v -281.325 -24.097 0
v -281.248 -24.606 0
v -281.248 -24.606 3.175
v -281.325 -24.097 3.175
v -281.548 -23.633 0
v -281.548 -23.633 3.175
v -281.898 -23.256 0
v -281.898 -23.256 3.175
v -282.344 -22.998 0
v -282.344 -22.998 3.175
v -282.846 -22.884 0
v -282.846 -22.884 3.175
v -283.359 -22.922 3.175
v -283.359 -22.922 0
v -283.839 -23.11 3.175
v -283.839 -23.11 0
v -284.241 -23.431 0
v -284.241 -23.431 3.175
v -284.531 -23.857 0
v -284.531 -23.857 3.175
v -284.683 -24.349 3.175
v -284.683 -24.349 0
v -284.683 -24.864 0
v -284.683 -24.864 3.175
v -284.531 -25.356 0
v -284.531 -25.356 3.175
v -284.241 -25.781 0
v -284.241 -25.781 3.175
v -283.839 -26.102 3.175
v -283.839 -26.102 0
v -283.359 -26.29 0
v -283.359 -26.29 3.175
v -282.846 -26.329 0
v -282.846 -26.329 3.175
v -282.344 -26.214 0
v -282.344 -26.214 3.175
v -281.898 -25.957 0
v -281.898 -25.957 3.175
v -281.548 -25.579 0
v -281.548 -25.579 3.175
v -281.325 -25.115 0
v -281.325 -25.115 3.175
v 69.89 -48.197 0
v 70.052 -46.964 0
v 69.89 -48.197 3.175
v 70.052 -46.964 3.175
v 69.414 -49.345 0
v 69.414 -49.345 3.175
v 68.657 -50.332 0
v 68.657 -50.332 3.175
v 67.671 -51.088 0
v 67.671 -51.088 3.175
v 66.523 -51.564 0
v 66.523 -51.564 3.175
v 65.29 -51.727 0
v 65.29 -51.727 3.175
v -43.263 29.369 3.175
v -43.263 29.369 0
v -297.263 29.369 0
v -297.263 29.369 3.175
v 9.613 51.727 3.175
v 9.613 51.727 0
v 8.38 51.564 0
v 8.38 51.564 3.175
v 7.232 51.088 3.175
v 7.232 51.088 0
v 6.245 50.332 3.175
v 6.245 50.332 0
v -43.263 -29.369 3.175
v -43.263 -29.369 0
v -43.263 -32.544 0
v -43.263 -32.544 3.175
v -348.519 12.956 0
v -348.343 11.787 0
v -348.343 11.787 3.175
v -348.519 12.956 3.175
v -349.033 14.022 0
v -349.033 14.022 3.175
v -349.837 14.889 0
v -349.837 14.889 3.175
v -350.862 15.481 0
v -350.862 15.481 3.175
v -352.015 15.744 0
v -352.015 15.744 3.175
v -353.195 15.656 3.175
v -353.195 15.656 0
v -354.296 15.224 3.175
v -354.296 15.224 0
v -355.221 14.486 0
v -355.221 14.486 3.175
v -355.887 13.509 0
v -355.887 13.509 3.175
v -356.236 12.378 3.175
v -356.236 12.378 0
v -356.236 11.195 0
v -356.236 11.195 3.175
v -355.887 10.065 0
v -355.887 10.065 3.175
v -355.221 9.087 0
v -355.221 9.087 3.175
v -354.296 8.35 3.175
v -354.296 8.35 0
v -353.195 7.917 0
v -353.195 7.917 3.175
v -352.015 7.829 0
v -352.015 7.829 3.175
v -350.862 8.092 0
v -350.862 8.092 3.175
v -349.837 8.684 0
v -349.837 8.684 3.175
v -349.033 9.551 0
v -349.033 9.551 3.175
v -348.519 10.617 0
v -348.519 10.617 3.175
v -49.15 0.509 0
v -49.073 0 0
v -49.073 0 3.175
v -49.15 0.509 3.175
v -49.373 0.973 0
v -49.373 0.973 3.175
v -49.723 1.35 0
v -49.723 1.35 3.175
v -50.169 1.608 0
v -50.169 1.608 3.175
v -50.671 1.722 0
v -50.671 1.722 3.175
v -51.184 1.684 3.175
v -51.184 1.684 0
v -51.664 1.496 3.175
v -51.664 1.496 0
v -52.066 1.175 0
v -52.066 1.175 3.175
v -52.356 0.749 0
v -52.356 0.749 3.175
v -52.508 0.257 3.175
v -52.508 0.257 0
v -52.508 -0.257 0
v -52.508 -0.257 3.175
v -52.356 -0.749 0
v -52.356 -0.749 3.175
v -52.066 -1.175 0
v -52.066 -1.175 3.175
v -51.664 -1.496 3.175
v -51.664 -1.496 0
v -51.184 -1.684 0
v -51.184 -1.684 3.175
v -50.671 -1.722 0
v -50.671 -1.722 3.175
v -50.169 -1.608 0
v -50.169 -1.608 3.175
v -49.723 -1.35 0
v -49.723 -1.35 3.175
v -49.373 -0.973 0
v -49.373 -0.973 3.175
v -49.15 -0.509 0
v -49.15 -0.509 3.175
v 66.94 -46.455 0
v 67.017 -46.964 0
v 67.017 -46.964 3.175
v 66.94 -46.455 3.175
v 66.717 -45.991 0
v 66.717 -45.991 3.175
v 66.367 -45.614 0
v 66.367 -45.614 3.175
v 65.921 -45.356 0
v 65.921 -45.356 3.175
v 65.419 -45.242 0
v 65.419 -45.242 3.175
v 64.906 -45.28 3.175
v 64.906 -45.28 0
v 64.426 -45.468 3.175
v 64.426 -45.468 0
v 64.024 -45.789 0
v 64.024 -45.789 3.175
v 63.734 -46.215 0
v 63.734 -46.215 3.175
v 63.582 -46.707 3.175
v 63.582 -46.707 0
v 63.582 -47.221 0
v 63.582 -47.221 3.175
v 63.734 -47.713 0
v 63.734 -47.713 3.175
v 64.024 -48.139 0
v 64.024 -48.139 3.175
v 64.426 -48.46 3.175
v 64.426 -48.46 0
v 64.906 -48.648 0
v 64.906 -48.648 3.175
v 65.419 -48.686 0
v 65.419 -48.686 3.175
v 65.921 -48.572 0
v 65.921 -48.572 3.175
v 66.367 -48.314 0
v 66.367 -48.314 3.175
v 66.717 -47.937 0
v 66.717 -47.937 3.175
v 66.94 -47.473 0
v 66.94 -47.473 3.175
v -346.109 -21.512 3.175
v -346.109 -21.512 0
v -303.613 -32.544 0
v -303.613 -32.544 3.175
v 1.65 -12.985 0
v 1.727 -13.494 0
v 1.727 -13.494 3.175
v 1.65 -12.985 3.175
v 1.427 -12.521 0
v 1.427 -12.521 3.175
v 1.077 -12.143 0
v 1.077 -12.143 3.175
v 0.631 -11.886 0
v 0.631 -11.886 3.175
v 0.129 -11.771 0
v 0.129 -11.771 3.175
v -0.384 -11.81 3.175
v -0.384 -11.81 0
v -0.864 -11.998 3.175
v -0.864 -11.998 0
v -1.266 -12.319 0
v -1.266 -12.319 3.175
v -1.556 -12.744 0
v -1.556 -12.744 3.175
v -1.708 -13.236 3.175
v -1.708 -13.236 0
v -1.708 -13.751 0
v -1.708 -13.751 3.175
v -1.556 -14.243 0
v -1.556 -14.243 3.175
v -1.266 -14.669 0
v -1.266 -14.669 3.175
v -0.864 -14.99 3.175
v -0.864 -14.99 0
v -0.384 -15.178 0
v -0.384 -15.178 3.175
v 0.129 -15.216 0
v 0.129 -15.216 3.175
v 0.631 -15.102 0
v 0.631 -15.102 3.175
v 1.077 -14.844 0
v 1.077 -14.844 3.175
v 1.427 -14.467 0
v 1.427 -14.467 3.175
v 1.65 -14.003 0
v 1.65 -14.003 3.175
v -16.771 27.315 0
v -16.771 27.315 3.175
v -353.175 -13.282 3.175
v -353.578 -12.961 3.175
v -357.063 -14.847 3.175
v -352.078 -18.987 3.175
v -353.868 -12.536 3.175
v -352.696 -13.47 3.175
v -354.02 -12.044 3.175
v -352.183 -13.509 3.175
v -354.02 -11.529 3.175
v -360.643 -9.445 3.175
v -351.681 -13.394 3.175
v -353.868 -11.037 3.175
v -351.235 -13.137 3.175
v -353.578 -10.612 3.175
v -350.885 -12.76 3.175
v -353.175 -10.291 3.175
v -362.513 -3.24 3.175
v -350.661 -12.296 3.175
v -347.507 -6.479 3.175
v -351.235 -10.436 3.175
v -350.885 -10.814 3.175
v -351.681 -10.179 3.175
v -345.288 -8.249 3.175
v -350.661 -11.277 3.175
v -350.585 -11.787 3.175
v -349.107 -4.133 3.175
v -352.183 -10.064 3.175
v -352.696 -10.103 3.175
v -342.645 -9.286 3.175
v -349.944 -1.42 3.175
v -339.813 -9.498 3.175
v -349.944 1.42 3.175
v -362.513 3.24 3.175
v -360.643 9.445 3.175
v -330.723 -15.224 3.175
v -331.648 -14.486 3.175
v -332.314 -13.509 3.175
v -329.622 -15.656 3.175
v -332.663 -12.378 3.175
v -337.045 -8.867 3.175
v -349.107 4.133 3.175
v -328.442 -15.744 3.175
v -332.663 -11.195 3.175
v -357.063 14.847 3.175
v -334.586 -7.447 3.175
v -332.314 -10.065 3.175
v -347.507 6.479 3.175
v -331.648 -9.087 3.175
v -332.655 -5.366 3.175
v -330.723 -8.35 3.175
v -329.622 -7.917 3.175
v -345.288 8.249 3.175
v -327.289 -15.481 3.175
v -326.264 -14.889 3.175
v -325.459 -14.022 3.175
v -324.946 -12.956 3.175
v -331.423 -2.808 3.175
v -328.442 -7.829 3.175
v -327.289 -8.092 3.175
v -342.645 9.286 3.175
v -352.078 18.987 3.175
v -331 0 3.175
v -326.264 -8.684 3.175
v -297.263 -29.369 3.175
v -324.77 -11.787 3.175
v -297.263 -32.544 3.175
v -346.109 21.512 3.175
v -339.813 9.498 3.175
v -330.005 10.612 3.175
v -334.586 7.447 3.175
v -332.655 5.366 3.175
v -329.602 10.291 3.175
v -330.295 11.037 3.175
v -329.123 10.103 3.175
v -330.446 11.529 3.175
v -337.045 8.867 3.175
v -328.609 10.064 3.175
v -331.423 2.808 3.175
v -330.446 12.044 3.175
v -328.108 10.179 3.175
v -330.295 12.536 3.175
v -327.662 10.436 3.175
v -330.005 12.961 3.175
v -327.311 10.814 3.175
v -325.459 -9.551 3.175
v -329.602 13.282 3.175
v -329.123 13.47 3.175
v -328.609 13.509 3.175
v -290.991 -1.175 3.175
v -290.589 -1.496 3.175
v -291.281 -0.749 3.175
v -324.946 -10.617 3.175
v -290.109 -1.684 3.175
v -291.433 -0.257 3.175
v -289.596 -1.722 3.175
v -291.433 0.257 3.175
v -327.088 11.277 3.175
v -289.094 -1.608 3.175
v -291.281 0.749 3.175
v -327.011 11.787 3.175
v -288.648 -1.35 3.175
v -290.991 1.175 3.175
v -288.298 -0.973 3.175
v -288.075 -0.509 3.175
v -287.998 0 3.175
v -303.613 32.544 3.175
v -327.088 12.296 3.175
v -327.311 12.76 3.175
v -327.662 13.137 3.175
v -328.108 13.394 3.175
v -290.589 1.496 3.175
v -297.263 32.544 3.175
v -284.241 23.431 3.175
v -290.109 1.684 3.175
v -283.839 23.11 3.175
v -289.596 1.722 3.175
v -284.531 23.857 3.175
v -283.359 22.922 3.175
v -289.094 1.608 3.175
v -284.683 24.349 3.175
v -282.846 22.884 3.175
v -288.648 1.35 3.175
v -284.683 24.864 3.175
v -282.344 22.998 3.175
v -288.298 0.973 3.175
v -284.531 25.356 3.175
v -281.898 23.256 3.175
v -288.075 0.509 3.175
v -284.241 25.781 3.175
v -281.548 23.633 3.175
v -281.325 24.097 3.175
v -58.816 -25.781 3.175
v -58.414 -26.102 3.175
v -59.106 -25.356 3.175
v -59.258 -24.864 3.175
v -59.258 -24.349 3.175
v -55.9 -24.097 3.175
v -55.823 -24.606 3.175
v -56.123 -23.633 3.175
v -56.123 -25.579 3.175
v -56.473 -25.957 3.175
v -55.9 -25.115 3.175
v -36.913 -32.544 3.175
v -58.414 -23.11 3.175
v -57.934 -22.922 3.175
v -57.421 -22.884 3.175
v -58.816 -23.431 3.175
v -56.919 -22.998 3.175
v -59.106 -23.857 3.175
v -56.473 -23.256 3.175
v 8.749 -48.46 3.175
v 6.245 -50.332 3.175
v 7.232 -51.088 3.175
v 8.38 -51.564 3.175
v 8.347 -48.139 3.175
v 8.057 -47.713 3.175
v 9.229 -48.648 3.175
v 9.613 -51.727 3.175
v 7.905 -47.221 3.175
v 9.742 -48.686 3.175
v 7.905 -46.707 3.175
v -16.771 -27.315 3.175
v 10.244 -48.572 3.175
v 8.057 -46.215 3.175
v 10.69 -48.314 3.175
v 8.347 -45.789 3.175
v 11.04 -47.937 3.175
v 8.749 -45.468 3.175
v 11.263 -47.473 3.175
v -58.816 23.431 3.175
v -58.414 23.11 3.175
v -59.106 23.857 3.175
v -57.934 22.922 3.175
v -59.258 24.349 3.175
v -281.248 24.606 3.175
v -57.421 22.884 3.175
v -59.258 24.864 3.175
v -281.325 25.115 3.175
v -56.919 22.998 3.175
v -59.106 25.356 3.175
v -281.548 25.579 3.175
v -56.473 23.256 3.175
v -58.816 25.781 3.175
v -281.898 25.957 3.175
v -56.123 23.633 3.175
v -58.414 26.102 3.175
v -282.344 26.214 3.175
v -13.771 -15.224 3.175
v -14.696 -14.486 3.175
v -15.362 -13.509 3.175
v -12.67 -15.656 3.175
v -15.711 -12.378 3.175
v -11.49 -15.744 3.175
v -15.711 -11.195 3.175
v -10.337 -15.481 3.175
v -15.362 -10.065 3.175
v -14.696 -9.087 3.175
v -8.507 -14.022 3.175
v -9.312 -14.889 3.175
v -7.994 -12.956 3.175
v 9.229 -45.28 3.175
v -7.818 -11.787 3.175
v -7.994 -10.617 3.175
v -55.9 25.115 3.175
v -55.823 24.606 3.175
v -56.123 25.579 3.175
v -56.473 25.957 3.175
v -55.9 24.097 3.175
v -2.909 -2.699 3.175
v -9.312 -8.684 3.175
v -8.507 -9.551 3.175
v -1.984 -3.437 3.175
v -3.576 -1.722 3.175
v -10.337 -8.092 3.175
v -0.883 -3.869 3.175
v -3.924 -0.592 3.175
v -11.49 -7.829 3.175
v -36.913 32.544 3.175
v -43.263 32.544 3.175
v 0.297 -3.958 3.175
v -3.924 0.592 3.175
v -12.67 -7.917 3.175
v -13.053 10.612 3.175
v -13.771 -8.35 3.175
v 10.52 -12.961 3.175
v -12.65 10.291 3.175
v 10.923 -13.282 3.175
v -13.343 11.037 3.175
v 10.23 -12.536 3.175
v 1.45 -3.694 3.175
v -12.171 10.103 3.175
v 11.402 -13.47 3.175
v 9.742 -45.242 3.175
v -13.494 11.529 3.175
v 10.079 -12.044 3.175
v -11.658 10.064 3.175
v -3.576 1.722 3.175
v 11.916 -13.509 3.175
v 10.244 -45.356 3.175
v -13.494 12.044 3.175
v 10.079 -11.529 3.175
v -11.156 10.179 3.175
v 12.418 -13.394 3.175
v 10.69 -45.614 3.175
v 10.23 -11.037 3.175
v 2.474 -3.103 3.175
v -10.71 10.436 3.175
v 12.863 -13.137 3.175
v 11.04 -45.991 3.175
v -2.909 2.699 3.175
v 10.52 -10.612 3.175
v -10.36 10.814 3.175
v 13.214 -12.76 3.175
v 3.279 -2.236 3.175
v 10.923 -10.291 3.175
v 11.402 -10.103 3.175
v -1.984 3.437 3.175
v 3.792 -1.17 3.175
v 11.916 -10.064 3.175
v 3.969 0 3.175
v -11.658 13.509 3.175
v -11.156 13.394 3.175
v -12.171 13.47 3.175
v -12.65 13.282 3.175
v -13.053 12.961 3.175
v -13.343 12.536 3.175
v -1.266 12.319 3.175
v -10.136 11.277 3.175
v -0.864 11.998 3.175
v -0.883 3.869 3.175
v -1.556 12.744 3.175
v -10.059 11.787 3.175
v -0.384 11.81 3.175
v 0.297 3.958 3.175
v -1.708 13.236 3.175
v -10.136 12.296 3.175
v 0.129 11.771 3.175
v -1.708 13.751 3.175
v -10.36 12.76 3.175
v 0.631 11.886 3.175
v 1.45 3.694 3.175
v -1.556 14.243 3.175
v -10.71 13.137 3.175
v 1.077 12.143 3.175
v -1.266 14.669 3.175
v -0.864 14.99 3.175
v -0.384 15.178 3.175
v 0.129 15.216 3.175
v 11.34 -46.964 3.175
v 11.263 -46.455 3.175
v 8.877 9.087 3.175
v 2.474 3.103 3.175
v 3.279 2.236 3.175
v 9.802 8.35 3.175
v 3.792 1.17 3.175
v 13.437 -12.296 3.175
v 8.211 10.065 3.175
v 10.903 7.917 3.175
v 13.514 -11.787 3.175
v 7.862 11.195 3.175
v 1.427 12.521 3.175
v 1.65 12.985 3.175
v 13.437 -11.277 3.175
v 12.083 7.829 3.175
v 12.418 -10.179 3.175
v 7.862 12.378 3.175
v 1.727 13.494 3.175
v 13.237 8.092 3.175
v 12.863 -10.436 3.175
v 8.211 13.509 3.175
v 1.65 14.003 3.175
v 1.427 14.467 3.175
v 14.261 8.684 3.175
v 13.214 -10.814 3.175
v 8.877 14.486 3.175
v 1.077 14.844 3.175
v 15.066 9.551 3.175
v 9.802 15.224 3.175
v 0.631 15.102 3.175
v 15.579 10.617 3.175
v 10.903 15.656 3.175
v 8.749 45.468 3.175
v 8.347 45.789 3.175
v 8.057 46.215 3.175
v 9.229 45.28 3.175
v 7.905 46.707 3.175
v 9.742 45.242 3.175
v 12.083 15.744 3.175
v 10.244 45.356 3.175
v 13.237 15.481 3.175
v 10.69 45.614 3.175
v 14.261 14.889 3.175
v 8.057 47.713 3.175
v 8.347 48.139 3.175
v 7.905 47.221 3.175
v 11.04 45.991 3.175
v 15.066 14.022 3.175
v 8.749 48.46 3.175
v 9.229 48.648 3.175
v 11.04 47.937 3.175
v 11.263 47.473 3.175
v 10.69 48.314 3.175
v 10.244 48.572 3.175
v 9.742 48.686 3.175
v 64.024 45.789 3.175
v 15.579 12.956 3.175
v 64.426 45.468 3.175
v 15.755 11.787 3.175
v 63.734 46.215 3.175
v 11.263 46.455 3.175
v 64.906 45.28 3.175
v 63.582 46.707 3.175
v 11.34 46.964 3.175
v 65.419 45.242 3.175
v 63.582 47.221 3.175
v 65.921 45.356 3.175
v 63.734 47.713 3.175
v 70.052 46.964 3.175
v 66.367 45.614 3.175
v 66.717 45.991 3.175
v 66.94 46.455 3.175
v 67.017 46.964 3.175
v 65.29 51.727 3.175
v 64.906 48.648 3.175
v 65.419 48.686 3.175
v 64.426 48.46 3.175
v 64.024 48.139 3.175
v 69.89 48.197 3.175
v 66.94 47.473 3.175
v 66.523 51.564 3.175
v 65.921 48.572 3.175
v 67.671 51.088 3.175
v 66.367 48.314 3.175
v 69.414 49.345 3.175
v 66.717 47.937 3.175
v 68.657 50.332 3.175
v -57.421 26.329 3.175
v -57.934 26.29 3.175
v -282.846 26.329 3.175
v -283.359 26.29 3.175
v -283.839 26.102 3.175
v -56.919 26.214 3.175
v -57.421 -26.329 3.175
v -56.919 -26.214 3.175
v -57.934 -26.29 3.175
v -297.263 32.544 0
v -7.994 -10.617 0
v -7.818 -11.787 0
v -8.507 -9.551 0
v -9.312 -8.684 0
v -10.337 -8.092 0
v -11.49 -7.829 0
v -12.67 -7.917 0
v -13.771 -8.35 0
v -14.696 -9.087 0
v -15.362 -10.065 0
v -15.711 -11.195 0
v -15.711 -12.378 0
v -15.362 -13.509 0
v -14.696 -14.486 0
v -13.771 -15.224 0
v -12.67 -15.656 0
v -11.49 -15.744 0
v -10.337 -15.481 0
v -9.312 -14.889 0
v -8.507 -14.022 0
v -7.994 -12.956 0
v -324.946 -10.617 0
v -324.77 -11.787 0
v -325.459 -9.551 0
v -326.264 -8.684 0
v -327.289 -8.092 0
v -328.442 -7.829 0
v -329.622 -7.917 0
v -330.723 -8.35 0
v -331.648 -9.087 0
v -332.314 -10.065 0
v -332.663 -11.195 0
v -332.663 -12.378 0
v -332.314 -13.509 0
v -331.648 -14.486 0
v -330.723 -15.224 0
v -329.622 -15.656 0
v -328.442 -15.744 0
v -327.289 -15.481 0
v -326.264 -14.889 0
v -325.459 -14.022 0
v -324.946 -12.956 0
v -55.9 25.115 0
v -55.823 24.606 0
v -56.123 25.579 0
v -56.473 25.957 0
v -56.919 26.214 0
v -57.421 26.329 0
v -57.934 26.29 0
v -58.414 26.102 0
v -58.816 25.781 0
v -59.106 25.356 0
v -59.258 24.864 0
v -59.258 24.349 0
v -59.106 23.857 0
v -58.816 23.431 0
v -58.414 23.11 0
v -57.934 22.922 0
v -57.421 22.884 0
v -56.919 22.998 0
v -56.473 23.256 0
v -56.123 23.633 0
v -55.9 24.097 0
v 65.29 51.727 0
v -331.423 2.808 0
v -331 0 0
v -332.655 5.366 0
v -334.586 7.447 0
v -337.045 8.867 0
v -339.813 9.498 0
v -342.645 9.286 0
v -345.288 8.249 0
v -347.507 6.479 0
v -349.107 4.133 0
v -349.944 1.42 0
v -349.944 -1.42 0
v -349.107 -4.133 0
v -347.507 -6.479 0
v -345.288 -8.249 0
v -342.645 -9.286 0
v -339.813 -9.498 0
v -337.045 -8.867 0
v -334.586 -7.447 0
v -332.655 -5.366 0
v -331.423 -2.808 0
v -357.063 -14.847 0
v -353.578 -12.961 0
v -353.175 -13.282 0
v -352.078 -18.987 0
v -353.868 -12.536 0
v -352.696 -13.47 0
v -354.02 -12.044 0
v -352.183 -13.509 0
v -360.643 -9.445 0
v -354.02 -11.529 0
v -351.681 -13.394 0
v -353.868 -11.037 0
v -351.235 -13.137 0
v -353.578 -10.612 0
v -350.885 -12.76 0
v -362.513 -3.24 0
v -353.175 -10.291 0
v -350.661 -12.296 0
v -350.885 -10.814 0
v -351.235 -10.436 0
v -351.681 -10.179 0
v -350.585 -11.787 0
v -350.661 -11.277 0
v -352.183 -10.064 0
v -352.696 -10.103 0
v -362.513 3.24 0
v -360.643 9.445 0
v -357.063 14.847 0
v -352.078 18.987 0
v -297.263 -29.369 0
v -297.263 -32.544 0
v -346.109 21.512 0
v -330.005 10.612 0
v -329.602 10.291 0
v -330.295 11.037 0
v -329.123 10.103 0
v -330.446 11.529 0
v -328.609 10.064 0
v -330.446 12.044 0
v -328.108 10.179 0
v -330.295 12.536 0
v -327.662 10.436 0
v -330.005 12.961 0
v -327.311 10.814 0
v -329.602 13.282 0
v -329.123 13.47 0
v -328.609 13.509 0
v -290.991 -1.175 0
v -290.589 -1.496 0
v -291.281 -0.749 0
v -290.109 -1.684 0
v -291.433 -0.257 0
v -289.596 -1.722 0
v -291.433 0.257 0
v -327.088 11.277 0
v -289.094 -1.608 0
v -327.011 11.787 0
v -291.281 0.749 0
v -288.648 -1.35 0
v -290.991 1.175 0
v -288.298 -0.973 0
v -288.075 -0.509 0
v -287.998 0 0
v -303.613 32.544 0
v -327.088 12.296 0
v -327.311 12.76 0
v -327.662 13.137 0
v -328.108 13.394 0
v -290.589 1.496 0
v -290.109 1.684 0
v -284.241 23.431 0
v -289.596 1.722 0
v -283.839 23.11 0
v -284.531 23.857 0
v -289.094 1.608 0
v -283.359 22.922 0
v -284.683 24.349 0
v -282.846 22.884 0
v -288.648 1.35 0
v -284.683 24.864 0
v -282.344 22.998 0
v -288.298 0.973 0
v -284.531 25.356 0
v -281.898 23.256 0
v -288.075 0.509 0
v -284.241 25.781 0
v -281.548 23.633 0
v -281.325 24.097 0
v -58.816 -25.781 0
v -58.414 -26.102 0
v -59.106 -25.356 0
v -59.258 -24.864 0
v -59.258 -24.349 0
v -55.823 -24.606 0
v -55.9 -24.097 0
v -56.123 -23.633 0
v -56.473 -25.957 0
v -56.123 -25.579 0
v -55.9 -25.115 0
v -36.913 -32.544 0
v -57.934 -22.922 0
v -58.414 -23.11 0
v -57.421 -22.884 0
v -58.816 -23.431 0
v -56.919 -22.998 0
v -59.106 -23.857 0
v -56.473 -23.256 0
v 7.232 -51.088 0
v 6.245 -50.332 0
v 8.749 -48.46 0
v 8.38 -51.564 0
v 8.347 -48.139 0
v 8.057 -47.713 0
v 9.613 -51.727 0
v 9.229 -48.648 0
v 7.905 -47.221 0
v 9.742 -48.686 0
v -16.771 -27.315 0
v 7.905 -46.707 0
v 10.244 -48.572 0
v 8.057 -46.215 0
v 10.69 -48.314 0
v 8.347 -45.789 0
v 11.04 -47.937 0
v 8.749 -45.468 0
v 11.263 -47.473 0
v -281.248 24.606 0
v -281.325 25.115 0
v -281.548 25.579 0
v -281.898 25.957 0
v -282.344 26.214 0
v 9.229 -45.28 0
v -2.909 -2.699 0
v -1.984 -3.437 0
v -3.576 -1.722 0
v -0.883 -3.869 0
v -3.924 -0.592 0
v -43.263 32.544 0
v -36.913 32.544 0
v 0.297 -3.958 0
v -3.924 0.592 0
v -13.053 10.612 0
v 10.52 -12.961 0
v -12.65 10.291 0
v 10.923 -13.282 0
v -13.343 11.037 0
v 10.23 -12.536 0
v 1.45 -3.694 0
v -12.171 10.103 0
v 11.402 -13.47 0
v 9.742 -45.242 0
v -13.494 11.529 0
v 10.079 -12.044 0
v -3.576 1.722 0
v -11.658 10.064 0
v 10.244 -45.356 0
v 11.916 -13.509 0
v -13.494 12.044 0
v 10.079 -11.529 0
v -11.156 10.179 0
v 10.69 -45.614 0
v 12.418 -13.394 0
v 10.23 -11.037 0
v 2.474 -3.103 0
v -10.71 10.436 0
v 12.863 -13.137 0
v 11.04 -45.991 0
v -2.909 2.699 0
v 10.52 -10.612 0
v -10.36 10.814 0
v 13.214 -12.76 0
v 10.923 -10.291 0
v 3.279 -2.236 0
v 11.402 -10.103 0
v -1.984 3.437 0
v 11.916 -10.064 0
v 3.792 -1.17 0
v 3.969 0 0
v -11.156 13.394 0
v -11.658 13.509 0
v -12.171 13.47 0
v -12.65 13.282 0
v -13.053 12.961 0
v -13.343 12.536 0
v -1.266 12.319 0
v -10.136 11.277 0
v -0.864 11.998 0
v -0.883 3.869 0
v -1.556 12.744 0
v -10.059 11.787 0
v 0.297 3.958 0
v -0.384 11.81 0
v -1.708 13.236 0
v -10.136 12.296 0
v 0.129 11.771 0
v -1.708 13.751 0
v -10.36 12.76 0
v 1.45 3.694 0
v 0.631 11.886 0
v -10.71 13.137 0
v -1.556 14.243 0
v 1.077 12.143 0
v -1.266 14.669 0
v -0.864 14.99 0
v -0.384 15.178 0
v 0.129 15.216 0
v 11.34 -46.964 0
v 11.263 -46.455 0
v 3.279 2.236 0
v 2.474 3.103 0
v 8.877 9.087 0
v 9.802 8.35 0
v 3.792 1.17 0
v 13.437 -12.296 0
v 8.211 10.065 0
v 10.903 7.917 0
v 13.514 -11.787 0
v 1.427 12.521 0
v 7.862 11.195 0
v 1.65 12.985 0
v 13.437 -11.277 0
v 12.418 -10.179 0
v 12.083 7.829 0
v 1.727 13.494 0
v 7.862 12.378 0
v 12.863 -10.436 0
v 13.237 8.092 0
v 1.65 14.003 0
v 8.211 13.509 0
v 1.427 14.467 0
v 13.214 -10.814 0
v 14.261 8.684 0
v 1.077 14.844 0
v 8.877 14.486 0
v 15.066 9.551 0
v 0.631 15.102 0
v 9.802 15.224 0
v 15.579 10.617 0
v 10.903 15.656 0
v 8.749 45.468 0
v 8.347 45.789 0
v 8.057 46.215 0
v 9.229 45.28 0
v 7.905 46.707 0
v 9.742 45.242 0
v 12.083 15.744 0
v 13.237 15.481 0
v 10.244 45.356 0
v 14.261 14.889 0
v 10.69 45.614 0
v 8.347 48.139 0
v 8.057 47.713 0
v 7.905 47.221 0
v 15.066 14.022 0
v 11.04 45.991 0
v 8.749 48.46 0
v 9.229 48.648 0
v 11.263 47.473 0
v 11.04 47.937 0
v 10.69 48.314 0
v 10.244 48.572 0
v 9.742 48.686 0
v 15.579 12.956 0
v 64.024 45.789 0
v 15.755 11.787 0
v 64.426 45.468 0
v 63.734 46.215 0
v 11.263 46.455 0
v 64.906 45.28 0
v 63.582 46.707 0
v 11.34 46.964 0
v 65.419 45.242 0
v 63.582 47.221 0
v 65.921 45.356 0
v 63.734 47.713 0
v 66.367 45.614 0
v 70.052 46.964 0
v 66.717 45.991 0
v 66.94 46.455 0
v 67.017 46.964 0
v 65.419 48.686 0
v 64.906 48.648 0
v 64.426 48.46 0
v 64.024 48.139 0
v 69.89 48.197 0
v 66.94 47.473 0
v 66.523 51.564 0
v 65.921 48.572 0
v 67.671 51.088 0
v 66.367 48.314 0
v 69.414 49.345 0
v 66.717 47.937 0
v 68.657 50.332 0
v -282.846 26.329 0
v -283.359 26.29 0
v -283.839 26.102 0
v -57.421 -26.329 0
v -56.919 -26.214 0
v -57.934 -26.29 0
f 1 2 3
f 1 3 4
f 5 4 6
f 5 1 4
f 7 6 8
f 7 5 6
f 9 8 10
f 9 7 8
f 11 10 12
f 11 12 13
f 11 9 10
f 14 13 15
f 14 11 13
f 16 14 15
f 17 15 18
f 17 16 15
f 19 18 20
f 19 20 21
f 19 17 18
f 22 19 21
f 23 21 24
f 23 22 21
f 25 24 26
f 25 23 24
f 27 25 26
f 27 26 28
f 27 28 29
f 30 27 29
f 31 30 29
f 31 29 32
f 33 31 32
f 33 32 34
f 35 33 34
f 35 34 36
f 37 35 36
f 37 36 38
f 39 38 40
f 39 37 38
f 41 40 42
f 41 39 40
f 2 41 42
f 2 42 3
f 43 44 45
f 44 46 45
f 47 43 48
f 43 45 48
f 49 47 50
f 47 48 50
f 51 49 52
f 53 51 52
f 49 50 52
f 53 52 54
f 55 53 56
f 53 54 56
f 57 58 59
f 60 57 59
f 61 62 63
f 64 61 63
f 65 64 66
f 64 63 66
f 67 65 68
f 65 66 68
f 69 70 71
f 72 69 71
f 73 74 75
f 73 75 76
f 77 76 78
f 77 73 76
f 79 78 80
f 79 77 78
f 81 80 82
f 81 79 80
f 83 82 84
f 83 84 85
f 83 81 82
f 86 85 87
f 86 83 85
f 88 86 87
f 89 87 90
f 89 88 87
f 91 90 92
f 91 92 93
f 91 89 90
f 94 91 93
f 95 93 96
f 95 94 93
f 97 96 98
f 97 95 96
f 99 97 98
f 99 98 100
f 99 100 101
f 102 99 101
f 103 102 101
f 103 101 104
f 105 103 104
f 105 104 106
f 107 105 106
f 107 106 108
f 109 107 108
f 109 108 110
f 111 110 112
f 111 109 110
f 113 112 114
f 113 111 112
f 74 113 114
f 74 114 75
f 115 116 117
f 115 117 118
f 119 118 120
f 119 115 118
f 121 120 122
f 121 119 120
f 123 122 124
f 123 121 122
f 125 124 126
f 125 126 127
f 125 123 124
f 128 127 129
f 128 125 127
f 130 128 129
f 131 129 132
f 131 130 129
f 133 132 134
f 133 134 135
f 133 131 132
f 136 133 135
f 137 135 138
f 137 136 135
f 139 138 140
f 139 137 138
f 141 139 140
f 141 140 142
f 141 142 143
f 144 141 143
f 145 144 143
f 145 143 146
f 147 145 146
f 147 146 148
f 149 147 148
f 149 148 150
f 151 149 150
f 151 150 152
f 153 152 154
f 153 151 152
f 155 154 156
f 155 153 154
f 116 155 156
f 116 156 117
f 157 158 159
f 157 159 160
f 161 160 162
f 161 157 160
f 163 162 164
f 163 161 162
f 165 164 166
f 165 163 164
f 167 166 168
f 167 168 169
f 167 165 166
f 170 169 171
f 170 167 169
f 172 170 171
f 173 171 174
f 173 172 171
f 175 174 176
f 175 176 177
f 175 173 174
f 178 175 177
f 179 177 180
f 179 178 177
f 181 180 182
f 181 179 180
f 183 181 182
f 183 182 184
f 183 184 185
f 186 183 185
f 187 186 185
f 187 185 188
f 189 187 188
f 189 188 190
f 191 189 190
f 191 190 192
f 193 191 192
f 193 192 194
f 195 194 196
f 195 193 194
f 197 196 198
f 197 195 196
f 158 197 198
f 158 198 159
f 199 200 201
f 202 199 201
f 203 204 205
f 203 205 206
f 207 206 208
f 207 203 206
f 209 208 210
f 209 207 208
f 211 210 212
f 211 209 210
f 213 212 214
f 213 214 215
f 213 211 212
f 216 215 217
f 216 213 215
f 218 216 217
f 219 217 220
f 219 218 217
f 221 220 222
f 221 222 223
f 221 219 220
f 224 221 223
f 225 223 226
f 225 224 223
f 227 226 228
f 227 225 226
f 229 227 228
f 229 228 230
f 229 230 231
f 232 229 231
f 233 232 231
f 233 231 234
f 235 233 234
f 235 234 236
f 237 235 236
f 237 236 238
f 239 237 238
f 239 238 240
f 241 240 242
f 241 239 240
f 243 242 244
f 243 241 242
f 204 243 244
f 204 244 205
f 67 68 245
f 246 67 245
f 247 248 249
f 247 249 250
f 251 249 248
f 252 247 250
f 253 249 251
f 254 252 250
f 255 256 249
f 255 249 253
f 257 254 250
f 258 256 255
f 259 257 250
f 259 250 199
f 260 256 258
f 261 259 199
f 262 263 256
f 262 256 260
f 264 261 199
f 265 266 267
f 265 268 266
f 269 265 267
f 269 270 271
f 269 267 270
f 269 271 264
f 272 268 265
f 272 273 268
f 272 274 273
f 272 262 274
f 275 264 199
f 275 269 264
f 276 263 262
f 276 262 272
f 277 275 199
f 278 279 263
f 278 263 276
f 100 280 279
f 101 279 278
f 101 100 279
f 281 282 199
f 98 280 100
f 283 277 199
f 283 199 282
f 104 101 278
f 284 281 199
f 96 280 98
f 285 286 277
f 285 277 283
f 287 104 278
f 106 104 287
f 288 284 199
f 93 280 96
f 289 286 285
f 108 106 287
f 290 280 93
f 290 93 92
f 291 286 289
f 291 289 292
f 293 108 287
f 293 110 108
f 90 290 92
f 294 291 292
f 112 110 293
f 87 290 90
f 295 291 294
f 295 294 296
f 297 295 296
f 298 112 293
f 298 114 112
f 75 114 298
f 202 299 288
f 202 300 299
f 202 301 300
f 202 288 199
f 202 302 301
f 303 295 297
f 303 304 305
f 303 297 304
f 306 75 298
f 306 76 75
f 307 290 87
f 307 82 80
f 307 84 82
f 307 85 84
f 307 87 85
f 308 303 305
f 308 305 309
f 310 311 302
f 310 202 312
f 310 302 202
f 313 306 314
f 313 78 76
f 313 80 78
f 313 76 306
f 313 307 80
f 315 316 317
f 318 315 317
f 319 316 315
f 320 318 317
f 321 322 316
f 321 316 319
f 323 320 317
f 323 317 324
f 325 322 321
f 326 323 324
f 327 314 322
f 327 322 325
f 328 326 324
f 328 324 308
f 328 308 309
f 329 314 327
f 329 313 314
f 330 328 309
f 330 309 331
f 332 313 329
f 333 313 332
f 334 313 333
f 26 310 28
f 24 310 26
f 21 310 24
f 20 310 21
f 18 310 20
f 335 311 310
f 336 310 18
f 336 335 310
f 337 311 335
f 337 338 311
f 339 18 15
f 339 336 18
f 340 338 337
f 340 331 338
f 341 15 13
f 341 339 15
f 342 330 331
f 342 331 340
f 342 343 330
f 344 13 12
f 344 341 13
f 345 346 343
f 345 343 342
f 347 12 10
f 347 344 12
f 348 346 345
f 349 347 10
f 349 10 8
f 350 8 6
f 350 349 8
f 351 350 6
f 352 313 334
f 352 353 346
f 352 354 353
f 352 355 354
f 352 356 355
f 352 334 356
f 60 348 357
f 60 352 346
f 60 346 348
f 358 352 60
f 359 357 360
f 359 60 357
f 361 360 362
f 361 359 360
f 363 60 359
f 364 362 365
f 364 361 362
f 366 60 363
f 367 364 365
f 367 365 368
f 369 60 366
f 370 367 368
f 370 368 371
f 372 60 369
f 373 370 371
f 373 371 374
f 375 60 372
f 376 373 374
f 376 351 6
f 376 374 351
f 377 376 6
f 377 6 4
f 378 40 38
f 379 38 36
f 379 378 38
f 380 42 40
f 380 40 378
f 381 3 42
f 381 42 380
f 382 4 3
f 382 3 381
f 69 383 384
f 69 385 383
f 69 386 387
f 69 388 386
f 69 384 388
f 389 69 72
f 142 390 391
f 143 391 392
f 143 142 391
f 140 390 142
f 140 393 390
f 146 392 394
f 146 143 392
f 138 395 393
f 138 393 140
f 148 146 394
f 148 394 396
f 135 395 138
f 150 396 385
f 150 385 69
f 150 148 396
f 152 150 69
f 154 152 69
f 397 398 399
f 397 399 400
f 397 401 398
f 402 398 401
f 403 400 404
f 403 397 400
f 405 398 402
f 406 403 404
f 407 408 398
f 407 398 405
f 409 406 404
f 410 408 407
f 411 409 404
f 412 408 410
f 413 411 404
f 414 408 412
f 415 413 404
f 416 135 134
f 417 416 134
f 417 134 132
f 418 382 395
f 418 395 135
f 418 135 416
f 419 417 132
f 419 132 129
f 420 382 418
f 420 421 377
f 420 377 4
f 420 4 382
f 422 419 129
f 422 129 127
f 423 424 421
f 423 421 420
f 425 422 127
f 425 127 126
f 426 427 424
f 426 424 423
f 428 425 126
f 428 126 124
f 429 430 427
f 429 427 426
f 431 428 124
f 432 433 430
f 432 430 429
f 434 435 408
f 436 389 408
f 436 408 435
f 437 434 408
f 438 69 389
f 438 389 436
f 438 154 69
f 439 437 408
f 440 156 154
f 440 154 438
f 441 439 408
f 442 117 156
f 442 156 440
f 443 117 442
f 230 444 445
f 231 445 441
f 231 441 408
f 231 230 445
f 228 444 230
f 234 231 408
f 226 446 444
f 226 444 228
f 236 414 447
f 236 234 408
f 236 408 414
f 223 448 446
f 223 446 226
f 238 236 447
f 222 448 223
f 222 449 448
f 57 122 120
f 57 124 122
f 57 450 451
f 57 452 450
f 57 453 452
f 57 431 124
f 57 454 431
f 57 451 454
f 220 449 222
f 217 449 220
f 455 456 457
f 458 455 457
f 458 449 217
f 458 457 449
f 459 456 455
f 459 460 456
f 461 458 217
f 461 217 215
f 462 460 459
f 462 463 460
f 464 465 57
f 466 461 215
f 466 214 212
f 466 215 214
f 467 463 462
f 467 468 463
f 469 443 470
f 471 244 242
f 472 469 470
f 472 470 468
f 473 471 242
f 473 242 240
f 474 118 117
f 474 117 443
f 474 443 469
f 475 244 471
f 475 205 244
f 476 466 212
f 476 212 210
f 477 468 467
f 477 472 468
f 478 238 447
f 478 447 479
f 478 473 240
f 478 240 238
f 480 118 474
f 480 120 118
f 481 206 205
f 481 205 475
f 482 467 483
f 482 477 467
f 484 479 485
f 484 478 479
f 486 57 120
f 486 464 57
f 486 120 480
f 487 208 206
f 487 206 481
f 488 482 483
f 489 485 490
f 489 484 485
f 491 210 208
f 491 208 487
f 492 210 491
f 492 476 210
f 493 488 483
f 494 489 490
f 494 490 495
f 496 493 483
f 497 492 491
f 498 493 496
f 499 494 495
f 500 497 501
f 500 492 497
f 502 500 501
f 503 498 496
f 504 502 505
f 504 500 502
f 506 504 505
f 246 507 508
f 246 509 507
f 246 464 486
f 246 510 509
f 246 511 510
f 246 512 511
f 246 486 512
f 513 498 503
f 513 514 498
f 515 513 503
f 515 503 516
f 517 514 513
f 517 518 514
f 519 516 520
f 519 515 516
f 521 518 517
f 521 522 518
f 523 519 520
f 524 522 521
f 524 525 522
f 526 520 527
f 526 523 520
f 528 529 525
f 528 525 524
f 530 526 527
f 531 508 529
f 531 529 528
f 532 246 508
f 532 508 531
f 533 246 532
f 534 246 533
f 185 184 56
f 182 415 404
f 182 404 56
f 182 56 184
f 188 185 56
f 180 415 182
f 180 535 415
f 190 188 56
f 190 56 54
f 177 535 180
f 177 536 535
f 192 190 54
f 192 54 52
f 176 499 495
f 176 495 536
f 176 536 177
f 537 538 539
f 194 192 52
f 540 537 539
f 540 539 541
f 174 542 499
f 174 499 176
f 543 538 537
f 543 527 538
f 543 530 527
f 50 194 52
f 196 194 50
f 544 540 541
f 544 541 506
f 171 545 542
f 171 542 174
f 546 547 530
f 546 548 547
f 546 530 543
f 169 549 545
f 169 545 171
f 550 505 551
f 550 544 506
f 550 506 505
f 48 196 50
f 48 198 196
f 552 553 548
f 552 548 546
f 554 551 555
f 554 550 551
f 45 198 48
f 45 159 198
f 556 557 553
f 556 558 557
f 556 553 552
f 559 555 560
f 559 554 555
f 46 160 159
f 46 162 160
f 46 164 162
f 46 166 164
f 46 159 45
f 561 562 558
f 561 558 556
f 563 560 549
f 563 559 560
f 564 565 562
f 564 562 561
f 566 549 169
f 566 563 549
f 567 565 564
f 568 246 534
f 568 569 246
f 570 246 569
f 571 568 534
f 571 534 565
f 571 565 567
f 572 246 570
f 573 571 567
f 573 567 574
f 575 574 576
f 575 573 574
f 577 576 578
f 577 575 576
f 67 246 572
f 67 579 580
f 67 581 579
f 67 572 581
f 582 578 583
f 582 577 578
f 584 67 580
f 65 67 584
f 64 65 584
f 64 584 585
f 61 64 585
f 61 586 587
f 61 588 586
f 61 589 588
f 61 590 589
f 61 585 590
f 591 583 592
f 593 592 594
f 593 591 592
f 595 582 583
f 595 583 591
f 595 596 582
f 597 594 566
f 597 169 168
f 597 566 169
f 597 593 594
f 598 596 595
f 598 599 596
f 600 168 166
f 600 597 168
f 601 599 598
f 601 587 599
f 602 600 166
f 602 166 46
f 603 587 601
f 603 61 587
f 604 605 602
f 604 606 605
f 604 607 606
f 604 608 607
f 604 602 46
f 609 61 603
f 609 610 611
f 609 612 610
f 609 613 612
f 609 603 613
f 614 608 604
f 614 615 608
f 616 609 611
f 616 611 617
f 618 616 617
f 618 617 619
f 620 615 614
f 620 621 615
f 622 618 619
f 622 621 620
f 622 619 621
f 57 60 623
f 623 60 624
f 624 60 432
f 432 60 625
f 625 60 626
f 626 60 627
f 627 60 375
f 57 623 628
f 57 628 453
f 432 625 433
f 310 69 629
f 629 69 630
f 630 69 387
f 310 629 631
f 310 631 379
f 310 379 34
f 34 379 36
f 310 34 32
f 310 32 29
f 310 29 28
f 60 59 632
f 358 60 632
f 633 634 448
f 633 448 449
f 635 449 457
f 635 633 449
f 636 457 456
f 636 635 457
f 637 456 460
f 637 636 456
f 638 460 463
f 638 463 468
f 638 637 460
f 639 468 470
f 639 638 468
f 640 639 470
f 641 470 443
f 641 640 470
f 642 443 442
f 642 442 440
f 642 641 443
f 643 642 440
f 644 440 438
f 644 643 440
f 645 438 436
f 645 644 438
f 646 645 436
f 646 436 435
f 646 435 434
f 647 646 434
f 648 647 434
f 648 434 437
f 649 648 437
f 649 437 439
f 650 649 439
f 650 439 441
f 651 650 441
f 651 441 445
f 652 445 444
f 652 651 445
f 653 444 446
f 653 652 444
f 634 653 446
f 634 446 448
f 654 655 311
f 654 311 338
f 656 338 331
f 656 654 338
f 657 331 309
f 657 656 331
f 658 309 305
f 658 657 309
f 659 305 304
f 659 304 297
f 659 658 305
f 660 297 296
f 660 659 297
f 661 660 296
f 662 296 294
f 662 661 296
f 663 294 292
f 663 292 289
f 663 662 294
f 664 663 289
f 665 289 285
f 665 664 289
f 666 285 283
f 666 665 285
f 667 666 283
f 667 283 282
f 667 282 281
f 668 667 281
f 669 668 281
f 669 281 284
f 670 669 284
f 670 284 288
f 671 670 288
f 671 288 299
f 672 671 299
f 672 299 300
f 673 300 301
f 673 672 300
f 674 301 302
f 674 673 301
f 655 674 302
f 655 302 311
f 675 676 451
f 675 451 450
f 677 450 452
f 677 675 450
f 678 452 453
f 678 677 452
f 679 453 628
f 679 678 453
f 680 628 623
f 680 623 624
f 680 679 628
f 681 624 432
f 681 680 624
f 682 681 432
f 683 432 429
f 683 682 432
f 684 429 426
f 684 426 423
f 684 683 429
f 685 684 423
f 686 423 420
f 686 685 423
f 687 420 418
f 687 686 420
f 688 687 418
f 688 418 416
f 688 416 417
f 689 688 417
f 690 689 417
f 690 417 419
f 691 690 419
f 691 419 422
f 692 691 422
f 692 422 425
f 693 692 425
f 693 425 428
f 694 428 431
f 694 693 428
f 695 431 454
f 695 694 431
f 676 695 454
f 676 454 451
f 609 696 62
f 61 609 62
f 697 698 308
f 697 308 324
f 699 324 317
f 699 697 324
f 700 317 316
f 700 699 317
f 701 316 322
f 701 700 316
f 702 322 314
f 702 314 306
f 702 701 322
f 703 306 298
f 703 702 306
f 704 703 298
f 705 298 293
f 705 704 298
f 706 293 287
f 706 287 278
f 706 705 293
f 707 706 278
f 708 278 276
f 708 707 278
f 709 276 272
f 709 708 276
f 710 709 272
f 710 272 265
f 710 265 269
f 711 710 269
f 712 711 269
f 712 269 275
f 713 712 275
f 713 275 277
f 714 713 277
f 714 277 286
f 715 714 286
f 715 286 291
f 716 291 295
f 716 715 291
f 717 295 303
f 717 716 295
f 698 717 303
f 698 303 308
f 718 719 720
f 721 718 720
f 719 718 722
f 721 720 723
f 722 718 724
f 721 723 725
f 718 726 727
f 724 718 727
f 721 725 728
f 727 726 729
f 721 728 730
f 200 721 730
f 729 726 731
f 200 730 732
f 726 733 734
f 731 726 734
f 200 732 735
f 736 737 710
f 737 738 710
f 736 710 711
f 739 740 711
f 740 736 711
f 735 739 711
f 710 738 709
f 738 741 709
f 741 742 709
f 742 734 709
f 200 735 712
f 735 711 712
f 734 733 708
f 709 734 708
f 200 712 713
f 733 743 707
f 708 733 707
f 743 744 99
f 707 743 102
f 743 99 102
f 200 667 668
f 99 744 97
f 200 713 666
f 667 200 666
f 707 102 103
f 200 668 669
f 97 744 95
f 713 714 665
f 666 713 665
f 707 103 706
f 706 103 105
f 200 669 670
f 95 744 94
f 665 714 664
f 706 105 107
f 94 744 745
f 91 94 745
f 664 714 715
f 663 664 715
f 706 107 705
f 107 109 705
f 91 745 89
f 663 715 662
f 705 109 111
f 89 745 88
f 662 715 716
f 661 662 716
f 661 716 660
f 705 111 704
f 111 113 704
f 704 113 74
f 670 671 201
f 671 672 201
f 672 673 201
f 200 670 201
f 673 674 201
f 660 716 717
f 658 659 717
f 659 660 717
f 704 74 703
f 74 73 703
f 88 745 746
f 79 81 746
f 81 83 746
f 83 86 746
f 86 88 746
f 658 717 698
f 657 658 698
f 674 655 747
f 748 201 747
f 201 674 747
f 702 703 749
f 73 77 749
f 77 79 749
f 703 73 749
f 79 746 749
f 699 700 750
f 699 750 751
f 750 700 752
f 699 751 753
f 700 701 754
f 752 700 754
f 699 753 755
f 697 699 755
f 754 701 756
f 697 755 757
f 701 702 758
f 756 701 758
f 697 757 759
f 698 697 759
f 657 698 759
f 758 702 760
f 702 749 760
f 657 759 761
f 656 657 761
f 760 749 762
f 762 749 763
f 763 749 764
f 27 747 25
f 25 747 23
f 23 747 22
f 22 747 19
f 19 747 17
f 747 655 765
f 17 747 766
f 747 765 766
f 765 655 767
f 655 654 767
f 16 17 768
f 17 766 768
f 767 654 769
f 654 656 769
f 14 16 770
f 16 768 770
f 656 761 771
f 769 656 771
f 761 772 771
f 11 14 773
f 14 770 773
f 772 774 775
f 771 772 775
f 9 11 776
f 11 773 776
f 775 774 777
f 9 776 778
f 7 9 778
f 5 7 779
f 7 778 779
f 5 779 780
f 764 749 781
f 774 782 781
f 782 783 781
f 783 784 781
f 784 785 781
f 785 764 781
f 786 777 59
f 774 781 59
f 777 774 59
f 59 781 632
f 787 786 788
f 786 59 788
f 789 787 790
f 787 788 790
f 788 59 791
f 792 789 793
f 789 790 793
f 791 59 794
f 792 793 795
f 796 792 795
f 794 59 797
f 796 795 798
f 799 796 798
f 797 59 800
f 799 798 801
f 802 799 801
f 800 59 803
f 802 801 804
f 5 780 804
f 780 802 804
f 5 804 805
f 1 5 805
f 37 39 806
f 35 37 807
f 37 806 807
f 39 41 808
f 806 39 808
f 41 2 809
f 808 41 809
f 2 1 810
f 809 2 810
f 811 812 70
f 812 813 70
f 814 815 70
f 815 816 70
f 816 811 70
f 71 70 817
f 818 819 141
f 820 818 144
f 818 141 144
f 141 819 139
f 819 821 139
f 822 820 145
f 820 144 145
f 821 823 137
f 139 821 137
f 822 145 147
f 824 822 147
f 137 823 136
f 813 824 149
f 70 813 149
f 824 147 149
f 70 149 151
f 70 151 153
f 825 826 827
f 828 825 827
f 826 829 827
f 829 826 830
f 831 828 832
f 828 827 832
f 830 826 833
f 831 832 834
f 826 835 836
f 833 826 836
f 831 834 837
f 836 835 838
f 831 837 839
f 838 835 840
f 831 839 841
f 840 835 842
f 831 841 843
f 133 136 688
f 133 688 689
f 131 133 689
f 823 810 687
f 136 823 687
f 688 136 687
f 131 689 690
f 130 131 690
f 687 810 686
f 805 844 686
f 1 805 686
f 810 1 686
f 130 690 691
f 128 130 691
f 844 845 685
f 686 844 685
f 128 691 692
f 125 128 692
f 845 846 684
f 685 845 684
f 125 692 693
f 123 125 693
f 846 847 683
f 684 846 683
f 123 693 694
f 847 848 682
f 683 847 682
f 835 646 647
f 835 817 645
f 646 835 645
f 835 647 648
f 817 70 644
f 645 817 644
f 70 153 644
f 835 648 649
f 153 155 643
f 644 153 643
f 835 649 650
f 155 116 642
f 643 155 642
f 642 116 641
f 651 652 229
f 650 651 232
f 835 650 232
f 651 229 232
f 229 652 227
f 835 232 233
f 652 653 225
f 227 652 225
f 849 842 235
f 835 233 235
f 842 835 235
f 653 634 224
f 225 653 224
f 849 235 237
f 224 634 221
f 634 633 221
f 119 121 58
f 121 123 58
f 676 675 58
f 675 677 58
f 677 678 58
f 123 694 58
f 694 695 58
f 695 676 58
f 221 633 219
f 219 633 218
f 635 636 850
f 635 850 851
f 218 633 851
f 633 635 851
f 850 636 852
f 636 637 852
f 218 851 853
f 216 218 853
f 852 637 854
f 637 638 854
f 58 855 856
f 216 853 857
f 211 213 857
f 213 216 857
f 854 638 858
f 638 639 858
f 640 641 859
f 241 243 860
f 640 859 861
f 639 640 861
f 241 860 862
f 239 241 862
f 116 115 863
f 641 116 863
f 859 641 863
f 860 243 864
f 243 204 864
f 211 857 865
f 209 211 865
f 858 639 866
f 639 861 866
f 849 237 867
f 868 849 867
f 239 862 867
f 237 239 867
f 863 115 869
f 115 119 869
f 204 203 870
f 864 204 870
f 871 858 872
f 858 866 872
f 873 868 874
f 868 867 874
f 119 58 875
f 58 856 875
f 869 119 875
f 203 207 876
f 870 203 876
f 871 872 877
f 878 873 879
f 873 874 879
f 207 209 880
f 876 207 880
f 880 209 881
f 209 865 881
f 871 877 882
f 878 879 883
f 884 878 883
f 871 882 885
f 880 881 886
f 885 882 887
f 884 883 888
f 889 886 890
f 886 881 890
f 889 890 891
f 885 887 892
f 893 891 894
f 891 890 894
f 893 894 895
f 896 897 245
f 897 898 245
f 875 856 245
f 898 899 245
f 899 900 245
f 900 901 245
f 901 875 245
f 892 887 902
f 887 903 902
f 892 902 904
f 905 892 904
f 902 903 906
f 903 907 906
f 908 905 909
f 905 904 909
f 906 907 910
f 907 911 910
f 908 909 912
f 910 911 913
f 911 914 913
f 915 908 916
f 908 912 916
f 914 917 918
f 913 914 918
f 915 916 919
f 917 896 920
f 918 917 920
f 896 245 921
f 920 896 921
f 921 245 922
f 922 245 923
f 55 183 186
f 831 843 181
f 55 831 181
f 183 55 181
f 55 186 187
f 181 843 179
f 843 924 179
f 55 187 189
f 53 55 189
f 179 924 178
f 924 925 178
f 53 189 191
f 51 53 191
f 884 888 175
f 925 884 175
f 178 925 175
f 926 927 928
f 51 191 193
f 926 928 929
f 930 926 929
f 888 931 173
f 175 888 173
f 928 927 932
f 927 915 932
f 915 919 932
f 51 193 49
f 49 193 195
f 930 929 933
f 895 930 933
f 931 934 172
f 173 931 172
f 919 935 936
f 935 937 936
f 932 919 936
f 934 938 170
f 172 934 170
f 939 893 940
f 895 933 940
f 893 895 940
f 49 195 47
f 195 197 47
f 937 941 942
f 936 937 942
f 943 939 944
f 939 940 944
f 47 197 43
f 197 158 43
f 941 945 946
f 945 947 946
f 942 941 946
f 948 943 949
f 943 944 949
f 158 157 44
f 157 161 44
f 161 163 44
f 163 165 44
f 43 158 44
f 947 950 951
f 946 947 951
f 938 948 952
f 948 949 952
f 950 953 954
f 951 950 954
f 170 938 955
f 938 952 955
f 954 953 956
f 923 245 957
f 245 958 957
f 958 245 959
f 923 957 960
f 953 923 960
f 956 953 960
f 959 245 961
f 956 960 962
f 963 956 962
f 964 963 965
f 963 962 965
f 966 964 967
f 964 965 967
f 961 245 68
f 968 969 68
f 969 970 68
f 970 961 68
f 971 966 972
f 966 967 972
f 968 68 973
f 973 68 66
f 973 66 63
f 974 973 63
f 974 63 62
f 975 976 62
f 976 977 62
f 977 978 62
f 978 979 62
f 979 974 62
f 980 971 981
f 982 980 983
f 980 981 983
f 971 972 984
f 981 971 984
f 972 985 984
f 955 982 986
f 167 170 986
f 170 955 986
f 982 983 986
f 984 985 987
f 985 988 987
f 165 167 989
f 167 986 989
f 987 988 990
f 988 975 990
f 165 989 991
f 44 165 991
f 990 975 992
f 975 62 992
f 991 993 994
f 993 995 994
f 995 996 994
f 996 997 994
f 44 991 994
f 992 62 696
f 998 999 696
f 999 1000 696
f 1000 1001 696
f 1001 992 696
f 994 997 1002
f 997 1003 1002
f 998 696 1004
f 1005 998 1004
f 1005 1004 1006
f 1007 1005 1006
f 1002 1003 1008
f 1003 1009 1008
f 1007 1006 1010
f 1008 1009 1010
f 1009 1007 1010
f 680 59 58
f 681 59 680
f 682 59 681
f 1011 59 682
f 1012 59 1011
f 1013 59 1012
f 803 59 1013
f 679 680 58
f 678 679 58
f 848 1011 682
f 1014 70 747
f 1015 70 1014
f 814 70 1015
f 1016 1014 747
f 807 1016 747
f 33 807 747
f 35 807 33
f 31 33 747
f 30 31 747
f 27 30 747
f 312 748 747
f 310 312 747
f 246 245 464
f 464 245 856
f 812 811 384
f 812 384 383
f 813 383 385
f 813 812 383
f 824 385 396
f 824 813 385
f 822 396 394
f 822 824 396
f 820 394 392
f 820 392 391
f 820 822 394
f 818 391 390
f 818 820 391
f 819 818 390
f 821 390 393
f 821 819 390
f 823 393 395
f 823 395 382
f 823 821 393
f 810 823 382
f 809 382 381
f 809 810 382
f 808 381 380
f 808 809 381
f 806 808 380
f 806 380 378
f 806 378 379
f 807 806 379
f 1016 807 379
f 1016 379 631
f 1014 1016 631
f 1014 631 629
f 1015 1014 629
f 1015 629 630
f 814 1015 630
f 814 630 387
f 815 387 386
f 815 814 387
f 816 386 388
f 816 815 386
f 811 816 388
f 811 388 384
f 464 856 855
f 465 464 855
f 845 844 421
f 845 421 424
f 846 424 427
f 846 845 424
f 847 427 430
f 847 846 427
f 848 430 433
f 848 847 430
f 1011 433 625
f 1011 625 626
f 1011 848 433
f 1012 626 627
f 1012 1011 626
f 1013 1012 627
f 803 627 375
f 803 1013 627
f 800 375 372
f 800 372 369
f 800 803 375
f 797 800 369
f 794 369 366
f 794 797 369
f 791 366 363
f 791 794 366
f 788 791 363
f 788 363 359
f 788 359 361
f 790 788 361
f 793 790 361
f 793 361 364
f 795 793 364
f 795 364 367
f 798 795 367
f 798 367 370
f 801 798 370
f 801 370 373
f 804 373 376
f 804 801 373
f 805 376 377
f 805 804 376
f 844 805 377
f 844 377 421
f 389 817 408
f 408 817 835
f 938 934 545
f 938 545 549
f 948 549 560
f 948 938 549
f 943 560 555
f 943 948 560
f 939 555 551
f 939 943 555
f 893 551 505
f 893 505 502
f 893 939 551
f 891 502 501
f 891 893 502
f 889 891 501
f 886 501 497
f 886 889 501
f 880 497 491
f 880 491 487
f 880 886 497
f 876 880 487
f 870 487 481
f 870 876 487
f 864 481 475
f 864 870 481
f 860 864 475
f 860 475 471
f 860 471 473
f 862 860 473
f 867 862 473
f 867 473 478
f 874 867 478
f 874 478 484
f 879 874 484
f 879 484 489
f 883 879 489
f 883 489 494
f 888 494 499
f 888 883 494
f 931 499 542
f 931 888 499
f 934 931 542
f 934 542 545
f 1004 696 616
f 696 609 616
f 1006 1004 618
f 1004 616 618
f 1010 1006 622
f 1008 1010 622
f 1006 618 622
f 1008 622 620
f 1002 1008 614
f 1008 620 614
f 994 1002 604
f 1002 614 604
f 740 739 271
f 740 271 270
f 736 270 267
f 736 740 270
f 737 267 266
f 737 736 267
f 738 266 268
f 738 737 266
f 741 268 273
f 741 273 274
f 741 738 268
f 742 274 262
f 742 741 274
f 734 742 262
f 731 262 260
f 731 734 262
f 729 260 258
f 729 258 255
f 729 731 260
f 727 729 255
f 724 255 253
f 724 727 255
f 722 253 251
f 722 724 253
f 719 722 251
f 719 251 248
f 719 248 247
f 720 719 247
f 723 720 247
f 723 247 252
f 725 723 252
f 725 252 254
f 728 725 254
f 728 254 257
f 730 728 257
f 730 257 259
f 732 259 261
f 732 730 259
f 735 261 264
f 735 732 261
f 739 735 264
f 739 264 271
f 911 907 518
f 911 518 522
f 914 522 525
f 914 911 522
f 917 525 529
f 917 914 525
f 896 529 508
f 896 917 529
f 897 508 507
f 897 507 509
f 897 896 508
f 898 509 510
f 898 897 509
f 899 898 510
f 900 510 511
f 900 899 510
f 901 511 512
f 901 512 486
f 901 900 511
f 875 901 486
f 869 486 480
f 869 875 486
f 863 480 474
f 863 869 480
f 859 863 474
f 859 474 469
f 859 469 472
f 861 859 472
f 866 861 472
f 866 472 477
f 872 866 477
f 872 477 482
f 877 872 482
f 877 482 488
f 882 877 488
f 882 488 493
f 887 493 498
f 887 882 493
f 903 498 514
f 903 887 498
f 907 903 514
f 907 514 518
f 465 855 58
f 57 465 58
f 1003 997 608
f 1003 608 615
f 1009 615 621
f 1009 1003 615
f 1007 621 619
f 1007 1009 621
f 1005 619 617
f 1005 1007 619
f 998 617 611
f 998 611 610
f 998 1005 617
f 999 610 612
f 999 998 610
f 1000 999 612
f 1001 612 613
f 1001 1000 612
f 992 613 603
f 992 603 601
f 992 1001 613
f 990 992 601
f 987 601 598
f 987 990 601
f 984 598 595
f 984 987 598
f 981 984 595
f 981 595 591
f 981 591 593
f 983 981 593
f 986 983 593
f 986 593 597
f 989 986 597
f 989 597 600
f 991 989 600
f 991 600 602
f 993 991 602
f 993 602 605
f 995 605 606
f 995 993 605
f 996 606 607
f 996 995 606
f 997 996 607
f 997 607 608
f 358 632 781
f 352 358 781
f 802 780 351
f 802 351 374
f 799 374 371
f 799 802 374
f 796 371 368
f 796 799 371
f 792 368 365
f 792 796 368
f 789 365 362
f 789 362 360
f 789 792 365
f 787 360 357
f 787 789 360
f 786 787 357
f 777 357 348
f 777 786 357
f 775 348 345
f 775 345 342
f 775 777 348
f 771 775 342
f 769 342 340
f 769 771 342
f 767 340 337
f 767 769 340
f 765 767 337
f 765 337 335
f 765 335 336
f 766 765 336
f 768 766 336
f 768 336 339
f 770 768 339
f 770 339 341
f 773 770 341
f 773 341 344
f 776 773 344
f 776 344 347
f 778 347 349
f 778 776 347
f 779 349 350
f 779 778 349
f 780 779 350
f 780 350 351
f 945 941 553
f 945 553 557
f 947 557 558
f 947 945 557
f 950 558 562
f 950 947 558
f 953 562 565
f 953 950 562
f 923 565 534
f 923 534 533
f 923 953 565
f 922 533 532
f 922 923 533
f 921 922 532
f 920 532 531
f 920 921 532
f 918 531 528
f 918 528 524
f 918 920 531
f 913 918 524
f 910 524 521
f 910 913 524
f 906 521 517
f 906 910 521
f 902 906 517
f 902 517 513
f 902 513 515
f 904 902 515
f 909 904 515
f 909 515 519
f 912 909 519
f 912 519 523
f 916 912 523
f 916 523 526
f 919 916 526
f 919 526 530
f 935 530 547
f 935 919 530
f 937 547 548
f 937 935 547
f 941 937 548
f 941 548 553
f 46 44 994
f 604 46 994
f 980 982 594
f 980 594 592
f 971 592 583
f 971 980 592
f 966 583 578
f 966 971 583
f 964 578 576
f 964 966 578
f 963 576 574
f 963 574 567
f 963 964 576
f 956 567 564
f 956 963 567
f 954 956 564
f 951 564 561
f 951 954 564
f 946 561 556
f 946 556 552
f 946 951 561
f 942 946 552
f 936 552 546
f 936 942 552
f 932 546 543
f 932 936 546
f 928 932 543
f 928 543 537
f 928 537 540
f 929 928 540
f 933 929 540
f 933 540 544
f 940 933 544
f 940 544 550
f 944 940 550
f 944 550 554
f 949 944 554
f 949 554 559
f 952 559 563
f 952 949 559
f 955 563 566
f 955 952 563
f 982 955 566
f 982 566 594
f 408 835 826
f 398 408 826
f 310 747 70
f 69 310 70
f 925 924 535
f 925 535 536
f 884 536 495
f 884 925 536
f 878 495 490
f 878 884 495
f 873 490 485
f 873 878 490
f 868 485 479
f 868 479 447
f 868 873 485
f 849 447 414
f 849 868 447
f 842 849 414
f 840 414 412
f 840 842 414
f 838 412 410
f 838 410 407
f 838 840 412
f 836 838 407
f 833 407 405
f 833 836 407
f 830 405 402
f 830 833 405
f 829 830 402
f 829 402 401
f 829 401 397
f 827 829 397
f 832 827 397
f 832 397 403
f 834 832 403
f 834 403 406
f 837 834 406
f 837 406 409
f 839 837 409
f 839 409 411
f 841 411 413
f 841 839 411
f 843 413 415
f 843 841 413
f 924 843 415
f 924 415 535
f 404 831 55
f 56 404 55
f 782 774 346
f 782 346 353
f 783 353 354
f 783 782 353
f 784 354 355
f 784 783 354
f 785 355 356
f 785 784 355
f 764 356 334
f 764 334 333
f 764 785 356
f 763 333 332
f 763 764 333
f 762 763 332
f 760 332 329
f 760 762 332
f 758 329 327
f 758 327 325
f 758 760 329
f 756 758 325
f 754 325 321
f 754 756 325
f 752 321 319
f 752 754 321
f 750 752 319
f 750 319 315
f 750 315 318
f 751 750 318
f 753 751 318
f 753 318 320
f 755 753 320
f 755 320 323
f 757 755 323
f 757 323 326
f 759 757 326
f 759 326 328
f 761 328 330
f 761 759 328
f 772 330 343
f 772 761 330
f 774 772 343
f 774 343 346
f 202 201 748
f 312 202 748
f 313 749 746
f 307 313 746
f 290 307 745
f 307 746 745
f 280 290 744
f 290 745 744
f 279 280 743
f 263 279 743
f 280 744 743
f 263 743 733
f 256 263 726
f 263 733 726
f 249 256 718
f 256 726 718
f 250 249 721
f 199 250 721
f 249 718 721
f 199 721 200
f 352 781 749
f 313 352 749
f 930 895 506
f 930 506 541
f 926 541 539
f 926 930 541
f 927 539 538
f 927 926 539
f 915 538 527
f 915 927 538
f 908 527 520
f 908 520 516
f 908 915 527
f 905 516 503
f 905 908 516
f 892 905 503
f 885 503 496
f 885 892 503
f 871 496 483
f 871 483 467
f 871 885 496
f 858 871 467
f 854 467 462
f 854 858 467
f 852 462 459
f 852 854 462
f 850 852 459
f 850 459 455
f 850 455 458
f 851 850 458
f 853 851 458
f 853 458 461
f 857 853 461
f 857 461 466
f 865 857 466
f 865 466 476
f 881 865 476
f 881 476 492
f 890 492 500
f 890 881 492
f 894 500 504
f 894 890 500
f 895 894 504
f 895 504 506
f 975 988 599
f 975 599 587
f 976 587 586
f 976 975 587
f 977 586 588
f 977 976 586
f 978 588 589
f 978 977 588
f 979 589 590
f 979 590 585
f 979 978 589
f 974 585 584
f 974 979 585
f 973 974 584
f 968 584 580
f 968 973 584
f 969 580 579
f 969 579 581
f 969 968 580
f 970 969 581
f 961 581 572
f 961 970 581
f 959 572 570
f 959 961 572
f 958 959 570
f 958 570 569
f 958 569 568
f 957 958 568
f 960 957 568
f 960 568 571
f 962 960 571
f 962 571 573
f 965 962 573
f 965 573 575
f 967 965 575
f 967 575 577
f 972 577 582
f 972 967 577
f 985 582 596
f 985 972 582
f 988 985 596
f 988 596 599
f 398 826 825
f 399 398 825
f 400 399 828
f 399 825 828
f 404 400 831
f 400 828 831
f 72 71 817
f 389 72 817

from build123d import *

# Parameters (mm, degrees)
F0_R     = 1.7272
F0_R_2   = 3.96875
F0_R_3   = 9.525
F1_DEPTH = 3.175
F2_R     = 4.7625


with BuildPart() as f1:
    # F0 (on Top) → F1 (new body)
    with BuildSketch(Plane.XY):
        with BuildLine():
            Line((-303.612563, 32.54375), (-346.10942, 21.512003))
            ThreePointArc((-346.10942, 21.512003), (-362.750125, 0), (-346.10942, -21.512003))
            Line((-346.10942, -21.512003), (-303.612563, -32.54375))
            Line((-303.612563, -32.54375), (-297.262563, -32.54375))
            Line((-297.262563, -32.54375), (-297.262563, -29.36875))
            Line((-297.262563, -29.36875), (-43.262563, -29.36875))
            Line((-43.262563, -29.36875), (-43.262563, -32.54375))
            Line((-43.262563, -32.54375), (-36.912563, -32.54375))
            Line((-36.912563, -32.54375), (-16.771103, -27.315234))
            Line((-16.771103, -27.315234), (6.2453, -50.331637))
            ThreePointArc((6.2453, -50.331637), (7.790366, -51.364017), (9.612896, -51.726541))
            Line((9.612896, -51.726541), (70.052399, -51.726541))
            Line((70.052399, -51.726541), (70.052399, 51.726541))
            Line((70.052399, 51.726541), (9.612896, 51.726541))
            ThreePointArc((9.612896, 51.726541), (7.790366, 51.364017), (6.2453, 50.331637))
            Line((6.2453, 50.331637), (-16.771103, 27.315234))
            Line((-16.771103, 27.315234), (-36.912563, 32.54375))
            Line((-36.912563, 32.54375), (-43.262563, 32.54375))
            Line((-43.262563, 32.54375), (-43.262563, 29.36875))
            Line((-43.262563, 29.36875), (-297.262563, 29.36875))
            Line((-297.262563, 29.36875), (-297.262563, 32.54375))
            Line((-297.262563, 32.54375), (-303.612563, 32.54375))
        make_face()
        with Locations((-282.975063, -24.60625)):
            Circle(F0_R, mode=Mode.SUBTRACT)
        with Locations((-352.311712, -11.786586)):
            Circle(F0_R, mode=Mode.SUBTRACT)
        with Locations((-328.738539, -11.786586)):
            Circle(F0_R_2, mode=Mode.SUBTRACT)
        with Locations((9.612896, -46.964041)):
            Circle(F0_R, mode=Mode.SUBTRACT)
        with Locations((65.289899, -46.964041)):
            Circle(F0_R, mode=Mode.SUBTRACT)
        with Locations((-57.550063, -24.60625)):
            Circle(F0_R, mode=Mode.SUBTRACT)
        with Locations((0, -13.49375)):
            Circle(F0_R, mode=Mode.SUBTRACT)
        with Locations((-11.786586, -11.786586)):
            Circle(F0_R_2, mode=Mode.SUBTRACT)
        with Locations((11.786586, -11.786586)):
            Circle(F0_R, mode=Mode.SUBTRACT)
        with Locations((-340.525125, 0)):
            Circle(F0_R_3, mode=Mode.SUBTRACT)
        with Locations((-352.311712, 11.786586)):
            Circle(F0_R_2, mode=Mode.SUBTRACT)
        with Locations((-328.738539, 11.786586)):
            Circle(F0_R, mode=Mode.SUBTRACT)
        with Locations((-289.725125, 0)):
            Circle(F0_R, mode=Mode.SUBTRACT)
        with Locations((-282.975063, 24.60625)):
            Circle(F0_R, mode=Mode.SUBTRACT)
        with Locations((-50.8, 0)):
            Circle(F0_R, mode=Mode.SUBTRACT)
        with Locations((-57.550063, 24.60625)):
            Circle(F0_R, mode=Mode.SUBTRACT)
        Circle(F0_R_2, mode=Mode.SUBTRACT)
        with Locations((-11.786586, 11.786586)):
            Circle(F0_R, mode=Mode.SUBTRACT)
        with Locations((11.786586, 11.786586)):
            Circle(F0_R_2, mode=Mode.SUBTRACT)
        with Locations((0, 13.49375)):
            Circle(F0_R, mode=Mode.SUBTRACT)
        with Locations((9.612896, 46.964041)):
            Circle(F0_R, mode=Mode.SUBTRACT)
        with Locations((65.289899, 46.964041)):
            Circle(F0_R, mode=Mode.SUBTRACT)
    extrude(amount=F1_DEPTH)

    # F2
    f2_edges = [f1.edges().sort_by_distance(p)[0] for p in [
        (70.052399, 51.726541, 1.5875),
        (70.052399, -51.726541, 1.5875),
    ]]
    fillet(f2_edges, radius=F2_R)


solid = f1.part
